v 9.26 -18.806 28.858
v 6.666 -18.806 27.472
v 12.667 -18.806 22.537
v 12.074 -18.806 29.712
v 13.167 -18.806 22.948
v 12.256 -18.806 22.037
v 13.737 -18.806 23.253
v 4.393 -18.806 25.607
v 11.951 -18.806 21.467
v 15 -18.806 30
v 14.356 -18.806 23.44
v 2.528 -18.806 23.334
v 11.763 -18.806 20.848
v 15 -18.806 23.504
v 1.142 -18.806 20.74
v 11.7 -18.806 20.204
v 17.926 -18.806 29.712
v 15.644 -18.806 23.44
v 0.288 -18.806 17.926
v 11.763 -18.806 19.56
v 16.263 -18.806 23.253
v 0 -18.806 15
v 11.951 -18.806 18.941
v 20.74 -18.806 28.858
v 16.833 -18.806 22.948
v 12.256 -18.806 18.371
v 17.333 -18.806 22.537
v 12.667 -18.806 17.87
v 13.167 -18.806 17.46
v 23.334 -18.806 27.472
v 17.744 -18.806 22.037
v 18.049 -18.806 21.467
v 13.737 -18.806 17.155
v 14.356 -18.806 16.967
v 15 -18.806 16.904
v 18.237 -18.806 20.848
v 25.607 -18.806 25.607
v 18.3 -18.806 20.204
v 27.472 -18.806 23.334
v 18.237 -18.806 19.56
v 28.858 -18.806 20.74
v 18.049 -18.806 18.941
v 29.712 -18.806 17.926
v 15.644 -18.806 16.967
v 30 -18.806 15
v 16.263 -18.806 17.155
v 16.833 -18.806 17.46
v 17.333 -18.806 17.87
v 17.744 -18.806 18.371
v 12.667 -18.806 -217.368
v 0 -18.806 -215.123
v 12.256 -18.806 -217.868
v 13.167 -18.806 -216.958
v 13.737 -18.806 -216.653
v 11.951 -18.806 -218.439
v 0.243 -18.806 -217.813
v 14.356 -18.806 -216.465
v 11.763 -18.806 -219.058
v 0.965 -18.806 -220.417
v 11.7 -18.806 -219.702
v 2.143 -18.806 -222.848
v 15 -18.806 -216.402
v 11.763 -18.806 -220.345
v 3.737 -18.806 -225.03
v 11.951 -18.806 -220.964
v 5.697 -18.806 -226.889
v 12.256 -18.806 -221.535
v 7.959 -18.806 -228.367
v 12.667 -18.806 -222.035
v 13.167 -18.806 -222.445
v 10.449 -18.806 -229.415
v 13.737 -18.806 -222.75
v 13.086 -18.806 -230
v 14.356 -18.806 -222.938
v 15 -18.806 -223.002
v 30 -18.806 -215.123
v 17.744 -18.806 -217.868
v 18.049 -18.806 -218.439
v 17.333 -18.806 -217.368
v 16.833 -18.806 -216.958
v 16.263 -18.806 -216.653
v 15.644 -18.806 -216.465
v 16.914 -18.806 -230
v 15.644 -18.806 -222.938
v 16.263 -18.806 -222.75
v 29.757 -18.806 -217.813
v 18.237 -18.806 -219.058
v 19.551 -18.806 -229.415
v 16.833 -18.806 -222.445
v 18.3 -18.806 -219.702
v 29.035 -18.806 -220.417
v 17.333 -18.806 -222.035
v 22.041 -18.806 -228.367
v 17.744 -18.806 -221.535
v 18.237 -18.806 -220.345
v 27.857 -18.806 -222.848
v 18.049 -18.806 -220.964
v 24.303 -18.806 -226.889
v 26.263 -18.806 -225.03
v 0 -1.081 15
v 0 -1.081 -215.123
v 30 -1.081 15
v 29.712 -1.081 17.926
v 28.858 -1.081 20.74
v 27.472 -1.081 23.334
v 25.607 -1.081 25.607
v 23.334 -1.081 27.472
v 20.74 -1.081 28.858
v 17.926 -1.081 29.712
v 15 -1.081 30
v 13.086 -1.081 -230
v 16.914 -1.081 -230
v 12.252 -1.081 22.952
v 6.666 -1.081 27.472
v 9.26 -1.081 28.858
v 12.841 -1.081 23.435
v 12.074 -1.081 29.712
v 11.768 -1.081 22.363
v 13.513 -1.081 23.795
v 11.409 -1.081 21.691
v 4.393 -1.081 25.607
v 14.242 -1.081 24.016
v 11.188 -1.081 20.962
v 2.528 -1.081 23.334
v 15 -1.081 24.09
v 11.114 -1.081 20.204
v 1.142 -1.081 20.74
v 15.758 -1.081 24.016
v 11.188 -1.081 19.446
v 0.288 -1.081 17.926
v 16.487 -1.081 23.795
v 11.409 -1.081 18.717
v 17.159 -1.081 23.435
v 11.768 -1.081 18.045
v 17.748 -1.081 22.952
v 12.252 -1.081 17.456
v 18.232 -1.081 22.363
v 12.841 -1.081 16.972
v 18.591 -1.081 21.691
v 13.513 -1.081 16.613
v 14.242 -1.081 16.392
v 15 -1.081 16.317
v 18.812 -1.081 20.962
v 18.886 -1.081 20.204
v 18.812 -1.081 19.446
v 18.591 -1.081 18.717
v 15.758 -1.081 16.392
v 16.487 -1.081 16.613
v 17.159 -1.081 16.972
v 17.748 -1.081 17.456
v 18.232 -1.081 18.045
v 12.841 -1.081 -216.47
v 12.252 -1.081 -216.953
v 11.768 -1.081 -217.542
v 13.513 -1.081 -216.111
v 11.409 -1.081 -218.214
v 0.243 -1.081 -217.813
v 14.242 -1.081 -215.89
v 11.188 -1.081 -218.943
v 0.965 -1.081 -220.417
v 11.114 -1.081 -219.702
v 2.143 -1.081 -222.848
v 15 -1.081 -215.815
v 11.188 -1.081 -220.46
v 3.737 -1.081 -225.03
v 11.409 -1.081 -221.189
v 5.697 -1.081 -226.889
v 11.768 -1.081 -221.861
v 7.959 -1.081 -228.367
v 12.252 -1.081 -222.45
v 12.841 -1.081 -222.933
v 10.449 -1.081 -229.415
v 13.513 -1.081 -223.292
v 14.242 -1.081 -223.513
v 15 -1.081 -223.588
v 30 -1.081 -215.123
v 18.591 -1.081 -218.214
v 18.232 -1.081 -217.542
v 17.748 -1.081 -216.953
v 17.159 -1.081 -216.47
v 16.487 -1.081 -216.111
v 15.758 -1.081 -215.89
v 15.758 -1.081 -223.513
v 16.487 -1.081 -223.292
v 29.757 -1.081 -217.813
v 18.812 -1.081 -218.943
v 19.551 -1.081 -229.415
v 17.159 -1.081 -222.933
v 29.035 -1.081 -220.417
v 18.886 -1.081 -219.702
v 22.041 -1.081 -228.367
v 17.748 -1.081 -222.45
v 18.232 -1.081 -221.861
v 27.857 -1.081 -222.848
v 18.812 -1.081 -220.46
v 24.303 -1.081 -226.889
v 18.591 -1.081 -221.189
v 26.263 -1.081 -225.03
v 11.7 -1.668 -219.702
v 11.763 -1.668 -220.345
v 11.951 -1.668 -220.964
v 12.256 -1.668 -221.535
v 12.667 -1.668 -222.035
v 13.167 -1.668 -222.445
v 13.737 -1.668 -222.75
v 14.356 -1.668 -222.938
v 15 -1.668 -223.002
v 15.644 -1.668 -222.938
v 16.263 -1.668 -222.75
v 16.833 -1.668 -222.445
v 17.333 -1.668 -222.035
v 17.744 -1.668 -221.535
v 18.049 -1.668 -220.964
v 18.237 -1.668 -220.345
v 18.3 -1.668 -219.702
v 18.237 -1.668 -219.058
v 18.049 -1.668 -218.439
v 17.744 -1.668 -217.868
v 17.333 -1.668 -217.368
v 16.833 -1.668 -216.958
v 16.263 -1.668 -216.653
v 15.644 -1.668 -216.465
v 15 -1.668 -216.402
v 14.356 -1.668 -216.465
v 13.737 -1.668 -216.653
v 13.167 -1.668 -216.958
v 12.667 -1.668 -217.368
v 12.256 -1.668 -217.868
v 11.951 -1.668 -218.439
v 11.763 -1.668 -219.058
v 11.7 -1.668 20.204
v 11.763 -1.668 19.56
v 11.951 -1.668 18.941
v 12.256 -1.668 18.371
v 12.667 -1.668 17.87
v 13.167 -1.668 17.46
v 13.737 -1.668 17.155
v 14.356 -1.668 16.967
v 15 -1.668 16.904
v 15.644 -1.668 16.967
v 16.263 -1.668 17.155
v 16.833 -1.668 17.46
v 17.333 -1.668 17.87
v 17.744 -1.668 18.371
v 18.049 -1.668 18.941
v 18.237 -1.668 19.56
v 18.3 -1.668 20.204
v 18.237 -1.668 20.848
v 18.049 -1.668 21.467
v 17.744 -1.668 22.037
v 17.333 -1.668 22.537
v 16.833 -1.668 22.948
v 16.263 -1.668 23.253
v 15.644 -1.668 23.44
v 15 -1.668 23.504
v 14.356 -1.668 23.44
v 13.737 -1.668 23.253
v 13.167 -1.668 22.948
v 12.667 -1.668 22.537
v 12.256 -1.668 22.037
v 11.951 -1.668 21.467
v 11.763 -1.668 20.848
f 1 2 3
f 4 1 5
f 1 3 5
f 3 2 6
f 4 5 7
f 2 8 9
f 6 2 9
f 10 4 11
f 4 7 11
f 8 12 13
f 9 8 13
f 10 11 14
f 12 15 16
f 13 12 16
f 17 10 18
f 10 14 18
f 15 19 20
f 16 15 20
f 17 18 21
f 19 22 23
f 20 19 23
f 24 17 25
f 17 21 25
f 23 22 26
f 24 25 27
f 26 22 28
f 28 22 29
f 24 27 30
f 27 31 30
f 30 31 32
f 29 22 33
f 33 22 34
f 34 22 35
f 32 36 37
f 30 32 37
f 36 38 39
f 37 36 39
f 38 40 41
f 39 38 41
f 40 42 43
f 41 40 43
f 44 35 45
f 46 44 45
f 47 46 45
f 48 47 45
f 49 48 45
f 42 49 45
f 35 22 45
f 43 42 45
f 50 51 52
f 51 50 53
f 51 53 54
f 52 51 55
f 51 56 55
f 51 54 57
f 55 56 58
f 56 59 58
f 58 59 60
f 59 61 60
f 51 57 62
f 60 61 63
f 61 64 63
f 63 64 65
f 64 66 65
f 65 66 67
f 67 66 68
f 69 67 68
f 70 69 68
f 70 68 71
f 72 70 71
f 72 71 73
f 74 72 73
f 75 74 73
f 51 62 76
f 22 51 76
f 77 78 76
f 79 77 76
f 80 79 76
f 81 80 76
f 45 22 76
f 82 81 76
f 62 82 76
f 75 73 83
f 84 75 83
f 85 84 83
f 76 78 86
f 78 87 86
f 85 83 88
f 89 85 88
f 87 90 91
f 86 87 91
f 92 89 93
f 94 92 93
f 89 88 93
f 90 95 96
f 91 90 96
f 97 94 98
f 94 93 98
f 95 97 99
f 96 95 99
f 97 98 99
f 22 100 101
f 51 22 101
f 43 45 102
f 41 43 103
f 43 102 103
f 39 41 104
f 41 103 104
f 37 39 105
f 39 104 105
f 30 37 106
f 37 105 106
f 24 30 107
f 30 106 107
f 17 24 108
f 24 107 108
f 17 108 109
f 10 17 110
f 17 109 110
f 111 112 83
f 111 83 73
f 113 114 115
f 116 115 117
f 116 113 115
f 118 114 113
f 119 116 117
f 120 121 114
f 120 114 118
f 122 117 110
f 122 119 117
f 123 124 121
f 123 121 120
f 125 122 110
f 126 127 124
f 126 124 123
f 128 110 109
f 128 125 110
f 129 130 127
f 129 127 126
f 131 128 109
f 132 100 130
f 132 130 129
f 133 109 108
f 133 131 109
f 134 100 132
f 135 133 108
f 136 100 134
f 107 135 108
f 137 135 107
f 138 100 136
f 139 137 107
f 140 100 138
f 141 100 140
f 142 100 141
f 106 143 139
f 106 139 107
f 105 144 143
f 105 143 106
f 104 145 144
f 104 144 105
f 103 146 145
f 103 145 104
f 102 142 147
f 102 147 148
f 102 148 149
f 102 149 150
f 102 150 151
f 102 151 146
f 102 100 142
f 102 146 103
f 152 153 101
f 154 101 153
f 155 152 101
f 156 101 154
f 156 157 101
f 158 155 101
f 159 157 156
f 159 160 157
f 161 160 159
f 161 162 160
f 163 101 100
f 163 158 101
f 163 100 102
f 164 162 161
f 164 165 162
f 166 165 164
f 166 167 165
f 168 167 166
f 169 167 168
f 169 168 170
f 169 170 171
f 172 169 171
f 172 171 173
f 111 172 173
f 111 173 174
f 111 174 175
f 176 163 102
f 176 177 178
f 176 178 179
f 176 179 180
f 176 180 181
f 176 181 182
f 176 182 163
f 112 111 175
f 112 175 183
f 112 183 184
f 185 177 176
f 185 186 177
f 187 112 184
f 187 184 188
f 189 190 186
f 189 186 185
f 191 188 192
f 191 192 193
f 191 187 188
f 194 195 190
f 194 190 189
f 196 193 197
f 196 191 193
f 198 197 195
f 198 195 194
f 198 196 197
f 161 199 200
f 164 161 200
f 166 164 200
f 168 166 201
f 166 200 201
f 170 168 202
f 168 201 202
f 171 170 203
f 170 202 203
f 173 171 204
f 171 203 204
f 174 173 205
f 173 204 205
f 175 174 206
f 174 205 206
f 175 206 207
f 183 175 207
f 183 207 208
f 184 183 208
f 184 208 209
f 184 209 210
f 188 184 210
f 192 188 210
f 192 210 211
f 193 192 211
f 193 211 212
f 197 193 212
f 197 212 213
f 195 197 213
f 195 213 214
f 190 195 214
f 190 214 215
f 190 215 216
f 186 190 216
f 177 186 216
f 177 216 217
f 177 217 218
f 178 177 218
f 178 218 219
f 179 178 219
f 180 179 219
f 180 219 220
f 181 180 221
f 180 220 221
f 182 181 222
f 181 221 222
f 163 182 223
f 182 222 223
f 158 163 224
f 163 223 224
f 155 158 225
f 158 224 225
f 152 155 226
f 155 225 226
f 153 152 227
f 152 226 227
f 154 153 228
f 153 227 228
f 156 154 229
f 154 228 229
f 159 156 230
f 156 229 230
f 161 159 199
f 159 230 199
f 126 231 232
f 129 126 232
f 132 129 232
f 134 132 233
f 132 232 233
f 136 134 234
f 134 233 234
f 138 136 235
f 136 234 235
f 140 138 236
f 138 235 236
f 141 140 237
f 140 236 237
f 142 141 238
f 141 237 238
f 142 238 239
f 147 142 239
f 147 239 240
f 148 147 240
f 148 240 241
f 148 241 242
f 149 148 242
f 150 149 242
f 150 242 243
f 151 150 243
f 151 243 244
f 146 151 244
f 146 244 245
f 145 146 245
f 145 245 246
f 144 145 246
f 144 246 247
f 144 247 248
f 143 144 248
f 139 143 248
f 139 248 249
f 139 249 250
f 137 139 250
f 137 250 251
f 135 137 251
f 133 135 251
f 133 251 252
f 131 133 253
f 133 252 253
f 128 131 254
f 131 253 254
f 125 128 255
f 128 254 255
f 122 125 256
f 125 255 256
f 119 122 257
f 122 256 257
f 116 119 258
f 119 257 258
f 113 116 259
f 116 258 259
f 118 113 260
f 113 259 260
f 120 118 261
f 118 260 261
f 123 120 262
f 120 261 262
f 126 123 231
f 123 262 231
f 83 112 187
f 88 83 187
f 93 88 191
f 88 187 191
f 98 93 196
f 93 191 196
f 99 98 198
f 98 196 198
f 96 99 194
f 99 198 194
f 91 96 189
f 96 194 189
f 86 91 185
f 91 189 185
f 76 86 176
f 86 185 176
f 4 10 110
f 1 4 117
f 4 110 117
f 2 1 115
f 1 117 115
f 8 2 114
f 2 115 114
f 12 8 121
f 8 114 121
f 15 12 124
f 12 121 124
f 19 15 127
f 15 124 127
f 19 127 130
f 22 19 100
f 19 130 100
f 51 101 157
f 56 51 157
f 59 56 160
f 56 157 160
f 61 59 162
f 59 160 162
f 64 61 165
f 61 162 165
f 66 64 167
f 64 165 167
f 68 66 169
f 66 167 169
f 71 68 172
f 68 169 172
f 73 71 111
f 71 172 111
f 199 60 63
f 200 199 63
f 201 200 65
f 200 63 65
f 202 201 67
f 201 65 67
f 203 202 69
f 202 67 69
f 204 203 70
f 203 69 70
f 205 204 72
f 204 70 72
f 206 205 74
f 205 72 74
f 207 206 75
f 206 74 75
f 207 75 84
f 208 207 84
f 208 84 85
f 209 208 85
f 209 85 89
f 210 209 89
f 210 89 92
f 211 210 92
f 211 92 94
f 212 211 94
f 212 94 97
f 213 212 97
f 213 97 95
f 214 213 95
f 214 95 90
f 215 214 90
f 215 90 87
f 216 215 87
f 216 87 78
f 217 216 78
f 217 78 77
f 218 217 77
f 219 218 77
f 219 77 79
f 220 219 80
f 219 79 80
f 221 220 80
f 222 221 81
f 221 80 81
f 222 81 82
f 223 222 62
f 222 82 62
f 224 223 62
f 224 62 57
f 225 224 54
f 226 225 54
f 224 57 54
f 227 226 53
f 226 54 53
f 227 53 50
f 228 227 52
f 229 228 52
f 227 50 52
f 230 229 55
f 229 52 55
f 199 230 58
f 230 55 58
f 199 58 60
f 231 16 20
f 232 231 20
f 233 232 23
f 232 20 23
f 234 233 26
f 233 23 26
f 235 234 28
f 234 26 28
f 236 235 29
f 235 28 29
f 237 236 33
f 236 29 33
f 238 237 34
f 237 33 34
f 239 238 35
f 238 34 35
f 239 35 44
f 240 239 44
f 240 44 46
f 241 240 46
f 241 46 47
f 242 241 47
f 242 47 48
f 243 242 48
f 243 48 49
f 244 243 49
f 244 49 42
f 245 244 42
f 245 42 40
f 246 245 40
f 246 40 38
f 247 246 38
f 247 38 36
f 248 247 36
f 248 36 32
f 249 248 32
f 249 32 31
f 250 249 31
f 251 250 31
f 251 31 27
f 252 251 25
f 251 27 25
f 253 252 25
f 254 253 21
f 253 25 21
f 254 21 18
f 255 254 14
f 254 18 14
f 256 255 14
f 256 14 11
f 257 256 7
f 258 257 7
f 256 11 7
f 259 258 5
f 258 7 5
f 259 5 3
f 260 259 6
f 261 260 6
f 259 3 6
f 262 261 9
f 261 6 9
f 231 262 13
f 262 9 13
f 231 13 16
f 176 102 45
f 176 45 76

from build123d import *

# Parameters (mm, degrees)
SKETCH_1_W                      = 200
SKETCH_1_H                      = 20
EXTRUDE_1_DEPTH                 = 30
SKETCH_3_W                      = 30
SKETCH_3_H                      = 17.724954358
EXTRUDE_2_DEPTH                 = 30
EXTRUDE_2_DEPTH_BACK            = 1
CUT_EXTRUDE_1_DEPTH             = 18
HOLE_WIZARD_G1_16_1_D           = 6.6
HOLE_WIZARD_G1_16_1_DEPTH       = 17.724954357
HOLE_WIZARD_G1_16_1_CSINK_D     = 7.773
HOLE_WIZARD_G1_16_1_CSINK_ANGLE = 90
SKETCH_9_W                      = 30
SKETCH_9_H                      = 17.724954358
EXTRUDE_3_DEPTH                 = 30
CUT_EXTRUDE_2_DEPTH             = 30
HOLE_WIZARD_G1_16_2_D           = 6.6
HOLE_WIZARD_G1_16_2_DEPTH       = 17.724954357
HOLE_WIZARD_G1_16_2_CSINK_D     = 7.773
HOLE_WIZARD_G1_16_2_CSINK_ANGLE = 90
SKETCH_14_W                     = 30
SKETCH_14_H                     = 1.0813423
SKETCH_14_H_2                   = 1.193703342
CUT_EXTRUDE_3_DEPTH             = 215


with BuildPart() as part:
    # 草图1 → 凸台-拉伸1 (new body)
    with BuildSketch(Plane(origin=(0, 0, 0), x_dir=(0, 0, -1), z_dir=(1, 0, 0))):
        with Locations((100, -10)):
            Rectangle(SKETCH_1_W, SKETCH_1_H)
    extrude(amount=EXTRUDE_1_DEPTH)

    # 草图3 → 凸台-拉伸2 (add, two sides)
    with BuildSketch(Plane.XY) as extrude_2_sk:
        with Locations((15, -9.943819479)):
            Rectangle(SKETCH_3_W, SKETCH_3_H)
    extrude(amount=EXTRUDE_2_DEPTH)
    extrude(extrude_2_sk.sketch, amount=-EXTRUDE_2_DEPTH_BACK)

    # 草图5 → 切除-拉伸1 (cut)
    with BuildSketch(Plane(origin=(0, -1.0813423, 0), x_dir=(1, 0, 0), z_dir=(0, 1, 0))):
        with BuildLine():
            ThreePointArc((15, -30), (4.393398282, -25.606601718), (0, -15))
            Line((0, -15), (0, -30))
            Line((0, -30), (15, -30))
        make_face()
        with BuildLine():
            Line((30, -30), (30, -15))
            ThreePointArc((30, -15), (25.606601718, -25.606601718), (15, -30))
            Line((15, -30), (30, -30))
        make_face()
    extrude(amount=-CUT_EXTRUDE_1_DEPTH, mode=Mode.SUBTRACT)

    # G1/16 螺纹孔1
    with Locations(Plane(origin=(0, -1.0813423, 0), x_dir=(1, 0, 0), z_dir=(0, 1, 0))):
        with Locations((15, -20.203891656)):
            CounterSinkHole(HOLE_WIZARD_G1_16_1_D / 2, HOLE_WIZARD_G1_16_1_CSINK_D / 2, depth=HOLE_WIZARD_G1_16_1_DEPTH, counter_sink_angle=HOLE_WIZARD_G1_16_1_CSINK_ANGLE)

    # 草图9 → 凸台-拉伸3 (add)
    with BuildSketch(Plane(origin=(0, 0, -200), x_dir=(-1, 0, 0), z_dir=(0, 0, -1))):
        with Locations((-15, -9.943819479)):
            Rectangle(SKETCH_9_W, SKETCH_9_H)
    extrude(amount=EXTRUDE_3_DEPTH)

    # 草图10 → 切除-拉伸2 (cut)
    with BuildSketch(Plane(origin=(0, -1.0813423, 0), x_dir=(1, 0, 0), z_dir=(0, 1, 0))):
        with BuildLine():
            Line((0, 230), (0, 215.122561862))
            ThreePointArc((0, 215.122561862), (3.737143337, 225.029532125), (13.086407972, 230))
            Line((13.086407972, 230), (0, 230))
        make_face()
        with BuildLine():
            ThreePointArc((16.913592028, 230), (26.262856663, 225.029532125), (30, 215.122561862))
            Line((30, 215.122561862), (30, 230))
            Line((30, 230), (16.913592028, 230))
        make_face()
    extrude(amount=-CUT_EXTRUDE_2_DEPTH, mode=Mode.SUBTRACT)

    # G1/16 螺纹孔2
    with Locations(Plane(origin=(0, -1.0813423, 0), x_dir=(1, 0, 0), z_dir=(0, 1, 0))):
        with Locations((15, 219.701584922)):
            CounterSinkHole(HOLE_WIZARD_G1_16_2_D / 2, HOLE_WIZARD_G1_16_2_CSINK_D / 2, depth=HOLE_WIZARD_G1_16_2_DEPTH, counter_sink_angle=HOLE_WIZARD_G1_16_2_CSINK_ANGLE)

    # 草图14 → 切除-拉伸3 (cut)
    with BuildSketch(Plane.XY):
        with Locations((15, -0.54067115)):
            Rectangle(SKETCH_14_W, SKETCH_14_H)
        with Locations((15, -19.403148329)):
            Rectangle(SKETCH_14_W, SKETCH_14_H_2)
    extrude(amount=-CUT_EXTRUDE_3_DEPTH, mode=Mode.SUBTRACT)


solid = part.part
